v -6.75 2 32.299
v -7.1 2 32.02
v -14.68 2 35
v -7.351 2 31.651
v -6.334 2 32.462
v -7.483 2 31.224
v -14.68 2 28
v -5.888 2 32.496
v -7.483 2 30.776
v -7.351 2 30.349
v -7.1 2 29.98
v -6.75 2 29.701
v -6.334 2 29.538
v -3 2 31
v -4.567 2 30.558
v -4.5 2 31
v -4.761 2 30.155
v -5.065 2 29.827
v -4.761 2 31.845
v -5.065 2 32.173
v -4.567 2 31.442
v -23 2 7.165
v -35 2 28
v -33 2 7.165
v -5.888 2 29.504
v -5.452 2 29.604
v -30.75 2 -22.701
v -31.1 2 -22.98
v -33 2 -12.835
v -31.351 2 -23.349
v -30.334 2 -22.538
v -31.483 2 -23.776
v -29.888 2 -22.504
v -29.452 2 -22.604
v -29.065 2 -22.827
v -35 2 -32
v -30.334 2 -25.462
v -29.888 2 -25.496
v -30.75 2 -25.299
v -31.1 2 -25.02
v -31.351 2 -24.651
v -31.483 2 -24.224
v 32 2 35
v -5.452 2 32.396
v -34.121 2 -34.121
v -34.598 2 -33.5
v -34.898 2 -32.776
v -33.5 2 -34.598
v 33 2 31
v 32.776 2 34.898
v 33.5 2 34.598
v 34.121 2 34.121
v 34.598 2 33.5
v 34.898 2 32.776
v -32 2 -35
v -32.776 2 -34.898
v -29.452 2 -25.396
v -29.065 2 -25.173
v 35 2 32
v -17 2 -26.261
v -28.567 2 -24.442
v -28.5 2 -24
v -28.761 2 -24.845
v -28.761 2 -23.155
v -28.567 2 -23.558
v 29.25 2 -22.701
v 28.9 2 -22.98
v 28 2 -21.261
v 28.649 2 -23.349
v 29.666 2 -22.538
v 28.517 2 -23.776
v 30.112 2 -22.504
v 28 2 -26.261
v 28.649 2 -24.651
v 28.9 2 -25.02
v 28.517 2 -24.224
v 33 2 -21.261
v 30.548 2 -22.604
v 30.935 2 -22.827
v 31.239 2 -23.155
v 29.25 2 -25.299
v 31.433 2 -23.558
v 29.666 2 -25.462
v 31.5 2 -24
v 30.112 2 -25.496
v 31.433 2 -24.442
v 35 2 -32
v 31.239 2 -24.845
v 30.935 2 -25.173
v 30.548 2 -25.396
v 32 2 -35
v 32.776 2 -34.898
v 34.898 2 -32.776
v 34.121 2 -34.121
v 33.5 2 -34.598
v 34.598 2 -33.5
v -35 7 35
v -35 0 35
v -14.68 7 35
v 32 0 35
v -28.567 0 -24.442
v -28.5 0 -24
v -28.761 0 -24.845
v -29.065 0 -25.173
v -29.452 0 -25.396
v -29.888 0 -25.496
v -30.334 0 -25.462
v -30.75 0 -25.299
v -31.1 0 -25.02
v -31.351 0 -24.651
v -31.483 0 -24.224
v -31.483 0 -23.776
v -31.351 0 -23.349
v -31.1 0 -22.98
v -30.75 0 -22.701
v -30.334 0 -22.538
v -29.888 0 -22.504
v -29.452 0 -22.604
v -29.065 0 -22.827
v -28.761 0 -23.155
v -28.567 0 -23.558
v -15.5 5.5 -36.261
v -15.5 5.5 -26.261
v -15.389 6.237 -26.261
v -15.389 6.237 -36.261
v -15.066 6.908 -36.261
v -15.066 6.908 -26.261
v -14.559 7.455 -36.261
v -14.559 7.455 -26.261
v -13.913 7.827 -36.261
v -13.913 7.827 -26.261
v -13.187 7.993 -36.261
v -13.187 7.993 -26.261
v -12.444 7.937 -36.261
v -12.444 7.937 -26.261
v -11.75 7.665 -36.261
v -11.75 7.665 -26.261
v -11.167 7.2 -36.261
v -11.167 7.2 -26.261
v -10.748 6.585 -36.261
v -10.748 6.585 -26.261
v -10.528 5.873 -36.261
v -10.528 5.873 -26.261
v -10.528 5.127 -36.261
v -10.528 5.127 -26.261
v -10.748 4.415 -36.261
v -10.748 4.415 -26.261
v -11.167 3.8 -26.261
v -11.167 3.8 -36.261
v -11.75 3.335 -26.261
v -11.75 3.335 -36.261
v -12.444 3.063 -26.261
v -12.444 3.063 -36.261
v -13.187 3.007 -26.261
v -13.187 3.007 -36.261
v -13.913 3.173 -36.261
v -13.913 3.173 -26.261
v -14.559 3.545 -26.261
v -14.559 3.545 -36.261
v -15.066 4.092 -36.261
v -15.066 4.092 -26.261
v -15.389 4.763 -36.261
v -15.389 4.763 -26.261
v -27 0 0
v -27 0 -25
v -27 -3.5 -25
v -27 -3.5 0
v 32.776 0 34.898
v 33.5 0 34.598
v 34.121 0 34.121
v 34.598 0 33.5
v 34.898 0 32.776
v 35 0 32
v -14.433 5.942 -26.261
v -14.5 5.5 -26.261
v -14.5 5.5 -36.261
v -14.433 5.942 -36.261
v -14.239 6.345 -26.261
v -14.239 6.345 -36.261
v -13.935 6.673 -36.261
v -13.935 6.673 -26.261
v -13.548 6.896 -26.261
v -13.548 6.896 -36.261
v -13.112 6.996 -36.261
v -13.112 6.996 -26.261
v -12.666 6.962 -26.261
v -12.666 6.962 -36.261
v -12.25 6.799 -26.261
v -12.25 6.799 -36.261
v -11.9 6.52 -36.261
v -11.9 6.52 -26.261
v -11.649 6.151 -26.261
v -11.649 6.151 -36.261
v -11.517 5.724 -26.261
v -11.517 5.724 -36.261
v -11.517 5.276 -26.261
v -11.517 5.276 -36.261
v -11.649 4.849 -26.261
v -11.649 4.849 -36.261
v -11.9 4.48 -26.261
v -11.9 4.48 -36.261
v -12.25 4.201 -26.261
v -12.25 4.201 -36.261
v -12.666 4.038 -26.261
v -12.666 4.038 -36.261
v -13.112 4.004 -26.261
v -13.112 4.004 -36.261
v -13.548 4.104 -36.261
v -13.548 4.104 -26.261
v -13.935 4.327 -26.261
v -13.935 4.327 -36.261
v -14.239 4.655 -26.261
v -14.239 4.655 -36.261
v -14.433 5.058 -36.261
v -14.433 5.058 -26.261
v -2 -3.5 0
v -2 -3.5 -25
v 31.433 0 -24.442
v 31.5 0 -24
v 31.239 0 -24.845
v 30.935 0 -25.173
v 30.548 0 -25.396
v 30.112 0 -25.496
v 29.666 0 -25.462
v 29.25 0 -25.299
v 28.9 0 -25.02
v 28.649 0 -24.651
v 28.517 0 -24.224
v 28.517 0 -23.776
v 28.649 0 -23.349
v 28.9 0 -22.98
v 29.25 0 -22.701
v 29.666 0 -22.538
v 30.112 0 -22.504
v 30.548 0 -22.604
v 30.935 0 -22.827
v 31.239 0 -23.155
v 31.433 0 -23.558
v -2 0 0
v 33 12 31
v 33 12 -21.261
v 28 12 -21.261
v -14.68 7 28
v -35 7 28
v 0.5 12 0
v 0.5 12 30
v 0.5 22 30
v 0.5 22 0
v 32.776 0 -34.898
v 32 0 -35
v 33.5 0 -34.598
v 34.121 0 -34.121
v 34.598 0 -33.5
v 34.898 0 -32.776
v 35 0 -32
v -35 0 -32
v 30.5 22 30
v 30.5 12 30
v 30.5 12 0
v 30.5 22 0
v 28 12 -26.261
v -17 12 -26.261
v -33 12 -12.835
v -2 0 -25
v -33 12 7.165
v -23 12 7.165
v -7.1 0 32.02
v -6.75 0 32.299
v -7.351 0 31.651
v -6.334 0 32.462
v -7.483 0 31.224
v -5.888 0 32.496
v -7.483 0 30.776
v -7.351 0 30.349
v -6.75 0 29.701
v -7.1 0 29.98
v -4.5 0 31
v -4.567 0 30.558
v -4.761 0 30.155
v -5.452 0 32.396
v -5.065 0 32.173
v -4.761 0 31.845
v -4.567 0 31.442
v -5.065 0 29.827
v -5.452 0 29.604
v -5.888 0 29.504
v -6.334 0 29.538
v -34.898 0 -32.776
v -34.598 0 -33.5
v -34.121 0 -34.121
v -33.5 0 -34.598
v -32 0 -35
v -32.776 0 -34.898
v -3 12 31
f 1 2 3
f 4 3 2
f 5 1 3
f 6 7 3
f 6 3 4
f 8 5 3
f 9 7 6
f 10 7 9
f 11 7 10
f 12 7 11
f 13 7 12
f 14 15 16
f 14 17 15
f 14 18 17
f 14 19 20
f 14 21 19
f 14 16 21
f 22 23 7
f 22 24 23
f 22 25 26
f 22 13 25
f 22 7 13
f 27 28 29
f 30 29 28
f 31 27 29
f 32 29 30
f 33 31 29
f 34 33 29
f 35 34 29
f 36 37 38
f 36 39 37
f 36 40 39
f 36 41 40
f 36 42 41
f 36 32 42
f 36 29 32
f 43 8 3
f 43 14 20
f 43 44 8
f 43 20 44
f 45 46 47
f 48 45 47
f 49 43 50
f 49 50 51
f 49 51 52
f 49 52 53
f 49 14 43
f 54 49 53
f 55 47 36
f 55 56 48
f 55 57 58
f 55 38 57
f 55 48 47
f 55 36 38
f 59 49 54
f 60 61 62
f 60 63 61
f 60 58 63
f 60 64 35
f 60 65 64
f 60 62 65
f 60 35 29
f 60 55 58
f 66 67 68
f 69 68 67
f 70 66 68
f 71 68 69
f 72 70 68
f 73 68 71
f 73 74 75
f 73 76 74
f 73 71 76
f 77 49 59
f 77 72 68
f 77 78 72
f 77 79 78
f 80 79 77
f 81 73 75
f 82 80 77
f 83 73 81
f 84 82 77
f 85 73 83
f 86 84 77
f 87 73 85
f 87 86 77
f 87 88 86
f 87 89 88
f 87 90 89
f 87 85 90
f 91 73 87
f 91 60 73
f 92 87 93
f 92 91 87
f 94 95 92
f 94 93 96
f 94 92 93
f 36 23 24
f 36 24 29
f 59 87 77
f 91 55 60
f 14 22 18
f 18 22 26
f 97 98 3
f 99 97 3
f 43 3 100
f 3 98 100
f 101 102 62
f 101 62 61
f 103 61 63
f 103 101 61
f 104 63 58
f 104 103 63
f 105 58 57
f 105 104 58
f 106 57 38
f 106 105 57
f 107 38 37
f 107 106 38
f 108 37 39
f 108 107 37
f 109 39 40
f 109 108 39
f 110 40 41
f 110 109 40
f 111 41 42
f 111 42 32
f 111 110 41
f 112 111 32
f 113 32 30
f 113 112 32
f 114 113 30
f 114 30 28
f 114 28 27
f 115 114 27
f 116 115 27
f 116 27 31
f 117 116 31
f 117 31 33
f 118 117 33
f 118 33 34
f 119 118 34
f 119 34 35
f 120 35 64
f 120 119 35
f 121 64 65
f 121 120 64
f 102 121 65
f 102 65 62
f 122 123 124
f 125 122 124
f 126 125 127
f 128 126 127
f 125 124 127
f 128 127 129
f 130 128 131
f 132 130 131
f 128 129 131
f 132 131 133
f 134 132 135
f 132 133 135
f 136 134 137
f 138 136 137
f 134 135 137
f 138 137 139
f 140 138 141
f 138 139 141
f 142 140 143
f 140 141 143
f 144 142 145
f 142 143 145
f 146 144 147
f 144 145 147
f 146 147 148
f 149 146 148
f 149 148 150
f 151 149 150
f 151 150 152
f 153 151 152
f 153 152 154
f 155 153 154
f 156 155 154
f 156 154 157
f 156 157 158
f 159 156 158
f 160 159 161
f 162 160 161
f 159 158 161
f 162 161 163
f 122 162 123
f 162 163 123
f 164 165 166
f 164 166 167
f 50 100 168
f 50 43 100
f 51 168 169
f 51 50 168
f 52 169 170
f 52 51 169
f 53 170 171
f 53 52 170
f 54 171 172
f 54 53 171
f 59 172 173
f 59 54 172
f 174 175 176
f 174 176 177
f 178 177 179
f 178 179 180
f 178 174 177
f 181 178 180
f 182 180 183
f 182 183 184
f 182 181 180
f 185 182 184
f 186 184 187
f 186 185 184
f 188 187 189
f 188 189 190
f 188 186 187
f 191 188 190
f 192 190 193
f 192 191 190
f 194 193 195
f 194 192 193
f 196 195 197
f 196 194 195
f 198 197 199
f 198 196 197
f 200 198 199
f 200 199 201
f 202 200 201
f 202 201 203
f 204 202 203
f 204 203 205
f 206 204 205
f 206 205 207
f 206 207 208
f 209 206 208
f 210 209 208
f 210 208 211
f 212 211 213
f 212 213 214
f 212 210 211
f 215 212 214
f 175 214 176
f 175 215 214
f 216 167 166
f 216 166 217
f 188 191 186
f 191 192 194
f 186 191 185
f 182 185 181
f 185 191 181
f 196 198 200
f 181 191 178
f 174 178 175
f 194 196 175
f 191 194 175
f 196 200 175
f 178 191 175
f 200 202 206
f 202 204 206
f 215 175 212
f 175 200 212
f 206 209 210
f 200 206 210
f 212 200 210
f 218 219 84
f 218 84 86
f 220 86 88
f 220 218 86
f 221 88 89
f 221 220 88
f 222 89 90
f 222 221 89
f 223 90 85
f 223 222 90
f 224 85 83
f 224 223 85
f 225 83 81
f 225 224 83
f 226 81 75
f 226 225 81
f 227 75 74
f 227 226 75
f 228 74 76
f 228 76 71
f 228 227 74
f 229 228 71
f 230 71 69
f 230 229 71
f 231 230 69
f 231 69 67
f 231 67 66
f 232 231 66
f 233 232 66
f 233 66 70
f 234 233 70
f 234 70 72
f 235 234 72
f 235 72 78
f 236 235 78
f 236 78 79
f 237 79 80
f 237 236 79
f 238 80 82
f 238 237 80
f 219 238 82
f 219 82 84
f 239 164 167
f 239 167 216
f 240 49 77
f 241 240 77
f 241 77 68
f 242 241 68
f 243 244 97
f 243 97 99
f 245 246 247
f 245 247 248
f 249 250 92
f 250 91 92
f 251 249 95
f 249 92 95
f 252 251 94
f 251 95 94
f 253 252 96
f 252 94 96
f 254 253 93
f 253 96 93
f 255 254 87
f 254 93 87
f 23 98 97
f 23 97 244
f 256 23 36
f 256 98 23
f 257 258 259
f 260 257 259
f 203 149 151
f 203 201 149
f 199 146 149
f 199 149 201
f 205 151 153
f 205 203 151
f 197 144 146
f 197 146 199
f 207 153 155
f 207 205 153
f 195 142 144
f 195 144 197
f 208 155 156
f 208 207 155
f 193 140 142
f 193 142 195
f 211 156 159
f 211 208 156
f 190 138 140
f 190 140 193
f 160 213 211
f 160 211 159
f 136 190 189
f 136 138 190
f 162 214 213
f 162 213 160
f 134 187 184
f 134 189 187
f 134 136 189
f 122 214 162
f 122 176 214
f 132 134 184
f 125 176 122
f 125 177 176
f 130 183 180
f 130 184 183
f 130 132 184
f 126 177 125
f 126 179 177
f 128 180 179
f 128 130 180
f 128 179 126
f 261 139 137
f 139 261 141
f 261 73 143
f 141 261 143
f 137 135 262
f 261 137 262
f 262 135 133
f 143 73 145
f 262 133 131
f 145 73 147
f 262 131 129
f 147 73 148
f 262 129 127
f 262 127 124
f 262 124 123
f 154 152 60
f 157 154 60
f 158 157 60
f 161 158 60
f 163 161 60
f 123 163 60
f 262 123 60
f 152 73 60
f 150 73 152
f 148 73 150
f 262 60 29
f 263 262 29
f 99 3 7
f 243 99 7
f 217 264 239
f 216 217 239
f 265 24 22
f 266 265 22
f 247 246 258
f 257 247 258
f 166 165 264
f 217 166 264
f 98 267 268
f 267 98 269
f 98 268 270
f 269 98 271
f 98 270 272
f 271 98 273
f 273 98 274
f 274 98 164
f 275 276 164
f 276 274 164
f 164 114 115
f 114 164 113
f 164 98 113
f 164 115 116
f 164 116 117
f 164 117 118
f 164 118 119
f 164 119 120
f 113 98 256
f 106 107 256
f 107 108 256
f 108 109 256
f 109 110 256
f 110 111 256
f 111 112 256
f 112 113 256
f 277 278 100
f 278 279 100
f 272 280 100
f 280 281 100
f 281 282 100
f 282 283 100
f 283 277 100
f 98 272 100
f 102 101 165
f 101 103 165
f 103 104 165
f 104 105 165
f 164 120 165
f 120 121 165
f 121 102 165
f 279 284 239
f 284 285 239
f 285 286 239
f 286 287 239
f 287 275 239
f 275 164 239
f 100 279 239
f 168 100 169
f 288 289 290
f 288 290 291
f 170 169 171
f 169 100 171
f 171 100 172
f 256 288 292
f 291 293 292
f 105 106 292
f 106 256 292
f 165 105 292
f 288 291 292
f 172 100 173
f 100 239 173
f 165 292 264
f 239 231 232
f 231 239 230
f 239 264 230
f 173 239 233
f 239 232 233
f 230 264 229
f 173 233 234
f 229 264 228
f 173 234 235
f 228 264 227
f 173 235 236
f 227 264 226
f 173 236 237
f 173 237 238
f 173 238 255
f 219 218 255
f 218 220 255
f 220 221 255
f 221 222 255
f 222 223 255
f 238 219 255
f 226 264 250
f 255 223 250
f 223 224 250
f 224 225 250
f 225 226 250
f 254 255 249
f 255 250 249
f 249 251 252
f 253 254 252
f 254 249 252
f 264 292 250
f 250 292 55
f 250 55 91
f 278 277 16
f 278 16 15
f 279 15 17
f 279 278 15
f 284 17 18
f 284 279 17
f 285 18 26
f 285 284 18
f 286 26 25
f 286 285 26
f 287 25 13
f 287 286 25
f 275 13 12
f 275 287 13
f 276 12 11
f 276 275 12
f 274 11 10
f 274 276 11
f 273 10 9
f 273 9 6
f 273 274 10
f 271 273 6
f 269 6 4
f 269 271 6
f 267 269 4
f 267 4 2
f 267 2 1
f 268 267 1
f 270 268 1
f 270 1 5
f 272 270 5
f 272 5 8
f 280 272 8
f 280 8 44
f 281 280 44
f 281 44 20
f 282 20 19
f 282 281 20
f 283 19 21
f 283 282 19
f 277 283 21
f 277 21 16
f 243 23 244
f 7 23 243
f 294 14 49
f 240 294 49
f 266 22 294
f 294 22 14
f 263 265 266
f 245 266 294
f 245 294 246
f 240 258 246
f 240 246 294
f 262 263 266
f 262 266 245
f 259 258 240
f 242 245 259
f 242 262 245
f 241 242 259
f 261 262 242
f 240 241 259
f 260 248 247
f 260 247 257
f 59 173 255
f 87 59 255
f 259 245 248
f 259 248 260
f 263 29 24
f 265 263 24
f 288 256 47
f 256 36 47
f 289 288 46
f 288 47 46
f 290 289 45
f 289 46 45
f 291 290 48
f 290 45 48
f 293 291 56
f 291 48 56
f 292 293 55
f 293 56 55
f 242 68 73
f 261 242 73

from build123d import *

# Parameters (mm, degrees)
SKIZZE1_W                       = 70
SKIZZE1_H                       = 70
SKIZZE1_R                       = 1.5
AUFSATZ_LINEAR_AUSTRAGEN1_DEPTH = 2
SKIZZE2_W                       = 20.32
SKIZZE2_H                       = 7
AUFSATZ_LINEAR_AUSTRAGEN2_DEPTH = 5
AUFSATZ_LINEAR_AUSTRAGEN3_DEPTH = 10
SKIZZE4_W                       = 30
SKIZZE4_H                       = 30
AUFSATZ_LINEAR_AUSTRAGEN4_DEPTH = 10
SKIZZE5_R                       = 2.5
SKIZZE5_R_2                     = 1.5
AUFSATZ_LINEAR_AUSTRAGEN5_DEPTH = 10
SKIZZE6_W                       = 25
SKIZZE6_H                       = 25
AUFSATZ_LINEAR_AUSTRAGEN6_DEPTH = 3.5
VERRUNDUNG1_R                   = 3


with BuildPart() as part:
    # Skizze1 → Aufsatz-Linear austragen1 (new body)
    with BuildSketch(Plane(origin=(0, 0, 0), x_dir=(1, 0, 0), z_dir=(0, 1, 0))):
        Rectangle(SKIZZE1_W, SKIZZE1_H)
        with Locations((-6, -31)):
            Circle(SKIZZE1_R, mode=Mode.SUBTRACT)
        with Locations((-30, 24)):
            Circle(SKIZZE1_R, mode=Mode.SUBTRACT)
        with Locations((30, 24)):
            Circle(SKIZZE1_R, mode=Mode.SUBTRACT)
    extrude(amount=AUFSATZ_LINEAR_AUSTRAGEN1_DEPTH)

    # Skizze2 → Aufsatz-Linear austragen2 (add)
    with BuildSketch(Plane(origin=(0, 2, 0), x_dir=(1, 0, 0), z_dir=(0, 1, 0))):
        with Locations((-24.84, -31.5)):
            Rectangle(SKIZZE2_W, SKIZZE2_H)
    extrude(amount=AUFSATZ_LINEAR_AUSTRAGEN2_DEPTH)

    # Skizze3 → Aufsatz-Linear austragen3 (add)
    with BuildSketch(Plane(origin=(0, 2, 0), x_dir=(1, 0, 0), z_dir=(0, 1, 0))):
        Polygon((-33, -7.164928148), (-23, -7.164928148), (-3, -31), (33, -31), (33, 21.260665951), (28, 21.260665951), (28, 26.260665951), (-17, 26.260665951), (-33, 12.835071852), align=None)
    extrude(amount=AUFSATZ_LINEAR_AUSTRAGEN3_DEPTH)

    # Skizze4 → Aufsatz-Linear austragen4 (add)
    with BuildSketch(Plane(origin=(0, 12, 0), x_dir=(1, 0, 0), z_dir=(0, 1, 0))):
        with Locations((15.5, -15)):
            Rectangle(SKIZZE4_W, SKIZZE4_H)
    extrude(amount=AUFSATZ_LINEAR_AUSTRAGEN4_DEPTH)

    # Skizze5 → Aufsatz-Linear austragen5 (add)
    with BuildSketch(Plane(origin=(0, 0, -26.260665951), x_dir=(-1, 0, 0), z_dir=(0, 0, -1))):
        with Locations((13, 5.5)):
            Circle(SKIZZE5_R)
        with Locations((13, 5.5)):
            Circle(SKIZZE5_R_2, mode=Mode.SUBTRACT)
    extrude(amount=AUFSATZ_LINEAR_AUSTRAGEN5_DEPTH)

    # Skizze6 → Aufsatz-Linear austragen6 (add)
    with BuildSketch(Plane.XZ):
        with Locations((-14.5, -12.5)):
            Rectangle(SKIZZE6_W, SKIZZE6_H)
    extrude(amount=AUFSATZ_LINEAR_AUSTRAGEN6_DEPTH)

    # Verrundung1
    verrundung1_edges = [part.edges().sort_by_distance(p)[0] for p in [
        (-35, 1, -35),
        (35, 1, -35),
        (35, 1, 35),
    ]]
    fillet(verrundung1_edges, radius=VERRUNDUNG1_R)


solid = part.part
